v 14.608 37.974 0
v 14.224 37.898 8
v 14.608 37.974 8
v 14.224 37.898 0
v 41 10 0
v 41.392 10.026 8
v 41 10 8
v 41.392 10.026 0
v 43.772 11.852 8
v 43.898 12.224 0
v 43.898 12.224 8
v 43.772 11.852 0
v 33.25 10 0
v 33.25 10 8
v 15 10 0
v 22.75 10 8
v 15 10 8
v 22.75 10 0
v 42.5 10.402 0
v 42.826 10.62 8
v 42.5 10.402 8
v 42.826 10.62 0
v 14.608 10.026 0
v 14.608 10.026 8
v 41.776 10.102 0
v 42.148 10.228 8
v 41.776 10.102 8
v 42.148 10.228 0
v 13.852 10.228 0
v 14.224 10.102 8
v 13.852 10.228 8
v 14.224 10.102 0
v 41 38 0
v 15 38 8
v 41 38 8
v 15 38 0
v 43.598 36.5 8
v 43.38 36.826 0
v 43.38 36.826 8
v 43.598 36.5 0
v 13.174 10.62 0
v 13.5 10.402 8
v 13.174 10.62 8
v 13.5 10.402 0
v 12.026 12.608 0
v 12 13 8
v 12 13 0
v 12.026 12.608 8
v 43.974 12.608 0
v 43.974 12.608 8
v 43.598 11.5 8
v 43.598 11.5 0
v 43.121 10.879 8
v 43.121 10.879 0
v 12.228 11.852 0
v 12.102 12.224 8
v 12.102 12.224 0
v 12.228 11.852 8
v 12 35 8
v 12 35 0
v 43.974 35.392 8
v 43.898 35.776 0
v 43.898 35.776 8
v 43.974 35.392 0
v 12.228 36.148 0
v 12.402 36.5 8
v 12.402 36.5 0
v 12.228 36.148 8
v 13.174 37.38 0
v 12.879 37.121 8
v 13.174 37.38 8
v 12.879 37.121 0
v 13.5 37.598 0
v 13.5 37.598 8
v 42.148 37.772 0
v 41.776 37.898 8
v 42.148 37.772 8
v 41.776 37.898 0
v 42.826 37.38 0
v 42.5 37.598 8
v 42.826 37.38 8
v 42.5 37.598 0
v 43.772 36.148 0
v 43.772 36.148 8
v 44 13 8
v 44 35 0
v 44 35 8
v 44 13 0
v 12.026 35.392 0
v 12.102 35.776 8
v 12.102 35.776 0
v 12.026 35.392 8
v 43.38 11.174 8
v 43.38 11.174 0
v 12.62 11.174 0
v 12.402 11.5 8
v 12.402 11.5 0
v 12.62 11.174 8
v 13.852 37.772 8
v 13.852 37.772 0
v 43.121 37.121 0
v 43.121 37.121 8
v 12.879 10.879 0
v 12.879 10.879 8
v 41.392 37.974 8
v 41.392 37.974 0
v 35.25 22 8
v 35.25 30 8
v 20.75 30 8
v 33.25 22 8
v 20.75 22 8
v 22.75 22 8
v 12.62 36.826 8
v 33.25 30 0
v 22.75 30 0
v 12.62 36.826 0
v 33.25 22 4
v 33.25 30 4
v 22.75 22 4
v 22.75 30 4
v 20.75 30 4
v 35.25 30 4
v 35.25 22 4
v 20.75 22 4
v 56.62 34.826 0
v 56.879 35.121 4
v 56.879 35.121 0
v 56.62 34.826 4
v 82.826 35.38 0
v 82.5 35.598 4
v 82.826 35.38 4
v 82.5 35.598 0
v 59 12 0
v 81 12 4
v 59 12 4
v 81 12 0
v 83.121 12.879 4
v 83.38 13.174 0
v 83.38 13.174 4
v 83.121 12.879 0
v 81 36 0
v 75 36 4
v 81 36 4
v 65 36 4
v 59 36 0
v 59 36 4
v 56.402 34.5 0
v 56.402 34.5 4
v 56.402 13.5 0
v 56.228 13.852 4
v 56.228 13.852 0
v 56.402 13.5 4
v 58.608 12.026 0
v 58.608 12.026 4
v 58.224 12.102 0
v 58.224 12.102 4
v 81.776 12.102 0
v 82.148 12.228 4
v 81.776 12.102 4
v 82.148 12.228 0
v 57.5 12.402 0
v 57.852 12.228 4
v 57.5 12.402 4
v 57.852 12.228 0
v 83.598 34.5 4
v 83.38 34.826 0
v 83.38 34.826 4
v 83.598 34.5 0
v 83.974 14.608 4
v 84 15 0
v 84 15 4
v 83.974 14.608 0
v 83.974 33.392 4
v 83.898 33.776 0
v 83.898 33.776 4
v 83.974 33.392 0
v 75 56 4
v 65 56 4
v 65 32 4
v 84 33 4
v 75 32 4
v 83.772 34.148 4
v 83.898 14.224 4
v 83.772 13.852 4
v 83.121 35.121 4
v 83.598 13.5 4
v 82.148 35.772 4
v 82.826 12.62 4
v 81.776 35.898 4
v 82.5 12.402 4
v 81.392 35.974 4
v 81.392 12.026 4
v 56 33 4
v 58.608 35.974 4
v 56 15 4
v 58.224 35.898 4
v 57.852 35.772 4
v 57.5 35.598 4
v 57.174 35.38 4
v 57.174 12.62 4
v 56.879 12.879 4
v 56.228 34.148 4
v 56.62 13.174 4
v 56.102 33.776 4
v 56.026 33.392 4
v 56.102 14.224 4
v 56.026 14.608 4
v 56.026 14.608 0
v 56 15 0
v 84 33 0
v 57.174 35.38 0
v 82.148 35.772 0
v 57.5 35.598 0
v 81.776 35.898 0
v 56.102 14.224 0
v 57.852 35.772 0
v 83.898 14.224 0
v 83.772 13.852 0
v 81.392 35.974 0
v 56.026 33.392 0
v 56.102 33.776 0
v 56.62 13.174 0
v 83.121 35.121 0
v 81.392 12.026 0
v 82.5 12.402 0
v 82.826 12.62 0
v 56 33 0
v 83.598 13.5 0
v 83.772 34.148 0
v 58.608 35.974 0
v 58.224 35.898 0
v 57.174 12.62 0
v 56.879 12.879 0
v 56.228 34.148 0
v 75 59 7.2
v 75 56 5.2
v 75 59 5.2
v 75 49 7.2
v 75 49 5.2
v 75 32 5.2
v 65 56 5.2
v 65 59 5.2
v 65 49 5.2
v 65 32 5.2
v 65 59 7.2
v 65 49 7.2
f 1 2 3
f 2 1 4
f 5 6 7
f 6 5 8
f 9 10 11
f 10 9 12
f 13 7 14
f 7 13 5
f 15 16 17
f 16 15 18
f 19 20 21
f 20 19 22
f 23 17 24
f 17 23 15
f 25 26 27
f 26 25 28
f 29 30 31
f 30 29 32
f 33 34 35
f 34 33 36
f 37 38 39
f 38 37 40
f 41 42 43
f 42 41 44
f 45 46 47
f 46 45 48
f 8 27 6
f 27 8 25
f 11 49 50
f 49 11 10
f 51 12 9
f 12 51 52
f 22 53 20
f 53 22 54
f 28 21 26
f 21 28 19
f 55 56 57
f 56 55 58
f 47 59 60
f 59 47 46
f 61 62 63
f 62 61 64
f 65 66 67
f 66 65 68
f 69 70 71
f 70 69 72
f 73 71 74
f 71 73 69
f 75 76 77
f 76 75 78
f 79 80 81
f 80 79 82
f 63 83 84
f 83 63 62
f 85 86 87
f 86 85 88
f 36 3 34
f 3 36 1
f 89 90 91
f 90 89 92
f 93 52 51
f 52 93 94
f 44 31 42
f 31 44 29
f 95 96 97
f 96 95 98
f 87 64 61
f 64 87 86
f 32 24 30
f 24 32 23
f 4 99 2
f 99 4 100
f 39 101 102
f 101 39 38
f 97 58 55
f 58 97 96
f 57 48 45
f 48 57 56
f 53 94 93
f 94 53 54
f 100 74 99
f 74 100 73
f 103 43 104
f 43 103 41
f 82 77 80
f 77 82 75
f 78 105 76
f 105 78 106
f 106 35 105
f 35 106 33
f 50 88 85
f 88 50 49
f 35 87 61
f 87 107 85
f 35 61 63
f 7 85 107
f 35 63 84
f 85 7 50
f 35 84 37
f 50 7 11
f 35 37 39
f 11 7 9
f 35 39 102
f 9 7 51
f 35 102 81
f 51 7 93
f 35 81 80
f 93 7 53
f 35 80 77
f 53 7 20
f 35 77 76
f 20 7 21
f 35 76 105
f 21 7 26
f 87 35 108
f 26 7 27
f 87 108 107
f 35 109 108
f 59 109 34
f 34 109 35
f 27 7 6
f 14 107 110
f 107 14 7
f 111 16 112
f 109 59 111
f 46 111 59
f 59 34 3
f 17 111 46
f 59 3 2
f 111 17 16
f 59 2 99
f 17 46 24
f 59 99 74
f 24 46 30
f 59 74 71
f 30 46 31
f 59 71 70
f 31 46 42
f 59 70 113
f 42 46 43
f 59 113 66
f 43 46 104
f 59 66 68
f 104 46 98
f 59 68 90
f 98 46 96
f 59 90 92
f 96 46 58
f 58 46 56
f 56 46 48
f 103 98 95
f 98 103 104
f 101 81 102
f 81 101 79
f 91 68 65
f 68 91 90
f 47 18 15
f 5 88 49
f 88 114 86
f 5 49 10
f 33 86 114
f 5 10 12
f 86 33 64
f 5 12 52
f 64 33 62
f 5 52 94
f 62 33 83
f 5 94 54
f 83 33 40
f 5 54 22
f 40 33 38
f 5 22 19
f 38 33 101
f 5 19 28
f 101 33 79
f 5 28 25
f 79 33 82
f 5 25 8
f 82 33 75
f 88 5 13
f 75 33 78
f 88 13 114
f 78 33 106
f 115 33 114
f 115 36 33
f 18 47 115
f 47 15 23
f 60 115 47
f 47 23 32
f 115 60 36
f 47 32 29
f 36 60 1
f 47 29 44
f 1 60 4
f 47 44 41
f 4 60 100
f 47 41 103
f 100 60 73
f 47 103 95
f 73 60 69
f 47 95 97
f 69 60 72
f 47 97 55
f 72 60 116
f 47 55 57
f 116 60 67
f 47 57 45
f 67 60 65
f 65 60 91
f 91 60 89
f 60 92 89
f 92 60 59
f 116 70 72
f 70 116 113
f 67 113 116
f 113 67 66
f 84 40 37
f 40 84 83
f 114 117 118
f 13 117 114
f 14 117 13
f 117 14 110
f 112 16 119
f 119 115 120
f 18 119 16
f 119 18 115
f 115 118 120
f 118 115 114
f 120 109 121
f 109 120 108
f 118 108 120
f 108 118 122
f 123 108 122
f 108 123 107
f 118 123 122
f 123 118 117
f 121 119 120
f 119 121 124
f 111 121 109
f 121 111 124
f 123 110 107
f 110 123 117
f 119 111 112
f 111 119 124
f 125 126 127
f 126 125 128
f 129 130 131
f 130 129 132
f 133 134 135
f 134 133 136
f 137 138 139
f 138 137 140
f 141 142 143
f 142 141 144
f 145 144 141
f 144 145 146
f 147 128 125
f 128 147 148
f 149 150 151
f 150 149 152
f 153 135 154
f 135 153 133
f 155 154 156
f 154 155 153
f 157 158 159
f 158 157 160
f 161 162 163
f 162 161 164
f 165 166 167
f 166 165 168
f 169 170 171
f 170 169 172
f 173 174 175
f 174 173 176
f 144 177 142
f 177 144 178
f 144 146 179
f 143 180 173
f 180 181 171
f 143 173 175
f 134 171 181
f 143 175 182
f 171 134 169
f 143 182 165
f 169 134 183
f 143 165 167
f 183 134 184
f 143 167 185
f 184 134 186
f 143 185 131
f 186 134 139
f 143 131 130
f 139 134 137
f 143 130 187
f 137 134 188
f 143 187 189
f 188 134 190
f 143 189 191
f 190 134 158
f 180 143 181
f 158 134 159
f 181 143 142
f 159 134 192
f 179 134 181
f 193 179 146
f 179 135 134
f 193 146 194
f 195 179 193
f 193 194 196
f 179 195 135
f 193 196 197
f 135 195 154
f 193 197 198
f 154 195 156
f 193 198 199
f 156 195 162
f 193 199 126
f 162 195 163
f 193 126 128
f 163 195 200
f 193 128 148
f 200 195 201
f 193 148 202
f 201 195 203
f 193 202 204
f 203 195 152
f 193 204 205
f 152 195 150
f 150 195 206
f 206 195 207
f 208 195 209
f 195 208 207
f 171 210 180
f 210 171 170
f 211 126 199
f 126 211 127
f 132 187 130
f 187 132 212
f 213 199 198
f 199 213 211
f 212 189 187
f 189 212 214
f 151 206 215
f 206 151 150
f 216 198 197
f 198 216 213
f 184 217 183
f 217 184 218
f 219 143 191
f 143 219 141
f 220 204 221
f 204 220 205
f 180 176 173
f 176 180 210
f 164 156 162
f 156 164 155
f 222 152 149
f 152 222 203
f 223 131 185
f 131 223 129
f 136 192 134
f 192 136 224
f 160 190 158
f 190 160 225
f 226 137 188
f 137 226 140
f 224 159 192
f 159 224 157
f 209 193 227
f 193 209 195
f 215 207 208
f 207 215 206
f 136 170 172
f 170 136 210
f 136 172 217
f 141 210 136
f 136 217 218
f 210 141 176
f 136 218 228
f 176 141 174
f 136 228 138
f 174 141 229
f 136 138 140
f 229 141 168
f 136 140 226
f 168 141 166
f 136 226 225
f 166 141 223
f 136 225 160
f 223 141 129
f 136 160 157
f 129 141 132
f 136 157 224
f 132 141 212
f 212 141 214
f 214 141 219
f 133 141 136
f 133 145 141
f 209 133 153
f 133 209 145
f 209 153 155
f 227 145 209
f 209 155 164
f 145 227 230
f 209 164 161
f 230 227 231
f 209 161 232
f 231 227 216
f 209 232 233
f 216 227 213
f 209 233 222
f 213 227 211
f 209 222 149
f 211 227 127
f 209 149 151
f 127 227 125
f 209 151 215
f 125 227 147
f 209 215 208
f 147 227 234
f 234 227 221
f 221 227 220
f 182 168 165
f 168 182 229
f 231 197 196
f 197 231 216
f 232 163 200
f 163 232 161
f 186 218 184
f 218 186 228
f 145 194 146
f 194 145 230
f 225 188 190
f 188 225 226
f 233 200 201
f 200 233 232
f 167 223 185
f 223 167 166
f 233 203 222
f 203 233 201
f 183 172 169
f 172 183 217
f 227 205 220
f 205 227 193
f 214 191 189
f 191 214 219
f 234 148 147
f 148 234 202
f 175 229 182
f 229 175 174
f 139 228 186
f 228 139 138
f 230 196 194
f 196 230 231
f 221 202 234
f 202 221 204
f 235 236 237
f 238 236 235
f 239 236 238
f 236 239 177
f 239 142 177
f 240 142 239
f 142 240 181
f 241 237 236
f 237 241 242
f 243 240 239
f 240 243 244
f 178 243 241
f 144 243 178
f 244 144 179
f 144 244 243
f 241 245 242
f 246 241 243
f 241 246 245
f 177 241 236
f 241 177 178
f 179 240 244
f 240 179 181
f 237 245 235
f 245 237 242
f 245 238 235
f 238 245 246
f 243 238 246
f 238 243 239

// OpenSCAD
/*
Sample 071: Wiederlösbarer Kragarm-Schnapper — standard 1,2 mm
Generated from the FDM Mechanical Sample Library.
Units: millimetres.

Override examples:
  openscad -o custom.stl -D 'view="plate"' -D 'render_fn=64' model.scad
  openscad -o preview.png -D 'view="assembly"' model.scad
*/
use <../../../library/fdm_mechanisms.scad>

render_fn = is_undef(render_fn) ? 48 : render_fn;
view = is_undef(view) ? "plate" : view;
$fn = render_fn;

sample_cantilever_snap(
    view=view,
    beam_t=1.2,
    clearance=0.25,
    hook=2
);
